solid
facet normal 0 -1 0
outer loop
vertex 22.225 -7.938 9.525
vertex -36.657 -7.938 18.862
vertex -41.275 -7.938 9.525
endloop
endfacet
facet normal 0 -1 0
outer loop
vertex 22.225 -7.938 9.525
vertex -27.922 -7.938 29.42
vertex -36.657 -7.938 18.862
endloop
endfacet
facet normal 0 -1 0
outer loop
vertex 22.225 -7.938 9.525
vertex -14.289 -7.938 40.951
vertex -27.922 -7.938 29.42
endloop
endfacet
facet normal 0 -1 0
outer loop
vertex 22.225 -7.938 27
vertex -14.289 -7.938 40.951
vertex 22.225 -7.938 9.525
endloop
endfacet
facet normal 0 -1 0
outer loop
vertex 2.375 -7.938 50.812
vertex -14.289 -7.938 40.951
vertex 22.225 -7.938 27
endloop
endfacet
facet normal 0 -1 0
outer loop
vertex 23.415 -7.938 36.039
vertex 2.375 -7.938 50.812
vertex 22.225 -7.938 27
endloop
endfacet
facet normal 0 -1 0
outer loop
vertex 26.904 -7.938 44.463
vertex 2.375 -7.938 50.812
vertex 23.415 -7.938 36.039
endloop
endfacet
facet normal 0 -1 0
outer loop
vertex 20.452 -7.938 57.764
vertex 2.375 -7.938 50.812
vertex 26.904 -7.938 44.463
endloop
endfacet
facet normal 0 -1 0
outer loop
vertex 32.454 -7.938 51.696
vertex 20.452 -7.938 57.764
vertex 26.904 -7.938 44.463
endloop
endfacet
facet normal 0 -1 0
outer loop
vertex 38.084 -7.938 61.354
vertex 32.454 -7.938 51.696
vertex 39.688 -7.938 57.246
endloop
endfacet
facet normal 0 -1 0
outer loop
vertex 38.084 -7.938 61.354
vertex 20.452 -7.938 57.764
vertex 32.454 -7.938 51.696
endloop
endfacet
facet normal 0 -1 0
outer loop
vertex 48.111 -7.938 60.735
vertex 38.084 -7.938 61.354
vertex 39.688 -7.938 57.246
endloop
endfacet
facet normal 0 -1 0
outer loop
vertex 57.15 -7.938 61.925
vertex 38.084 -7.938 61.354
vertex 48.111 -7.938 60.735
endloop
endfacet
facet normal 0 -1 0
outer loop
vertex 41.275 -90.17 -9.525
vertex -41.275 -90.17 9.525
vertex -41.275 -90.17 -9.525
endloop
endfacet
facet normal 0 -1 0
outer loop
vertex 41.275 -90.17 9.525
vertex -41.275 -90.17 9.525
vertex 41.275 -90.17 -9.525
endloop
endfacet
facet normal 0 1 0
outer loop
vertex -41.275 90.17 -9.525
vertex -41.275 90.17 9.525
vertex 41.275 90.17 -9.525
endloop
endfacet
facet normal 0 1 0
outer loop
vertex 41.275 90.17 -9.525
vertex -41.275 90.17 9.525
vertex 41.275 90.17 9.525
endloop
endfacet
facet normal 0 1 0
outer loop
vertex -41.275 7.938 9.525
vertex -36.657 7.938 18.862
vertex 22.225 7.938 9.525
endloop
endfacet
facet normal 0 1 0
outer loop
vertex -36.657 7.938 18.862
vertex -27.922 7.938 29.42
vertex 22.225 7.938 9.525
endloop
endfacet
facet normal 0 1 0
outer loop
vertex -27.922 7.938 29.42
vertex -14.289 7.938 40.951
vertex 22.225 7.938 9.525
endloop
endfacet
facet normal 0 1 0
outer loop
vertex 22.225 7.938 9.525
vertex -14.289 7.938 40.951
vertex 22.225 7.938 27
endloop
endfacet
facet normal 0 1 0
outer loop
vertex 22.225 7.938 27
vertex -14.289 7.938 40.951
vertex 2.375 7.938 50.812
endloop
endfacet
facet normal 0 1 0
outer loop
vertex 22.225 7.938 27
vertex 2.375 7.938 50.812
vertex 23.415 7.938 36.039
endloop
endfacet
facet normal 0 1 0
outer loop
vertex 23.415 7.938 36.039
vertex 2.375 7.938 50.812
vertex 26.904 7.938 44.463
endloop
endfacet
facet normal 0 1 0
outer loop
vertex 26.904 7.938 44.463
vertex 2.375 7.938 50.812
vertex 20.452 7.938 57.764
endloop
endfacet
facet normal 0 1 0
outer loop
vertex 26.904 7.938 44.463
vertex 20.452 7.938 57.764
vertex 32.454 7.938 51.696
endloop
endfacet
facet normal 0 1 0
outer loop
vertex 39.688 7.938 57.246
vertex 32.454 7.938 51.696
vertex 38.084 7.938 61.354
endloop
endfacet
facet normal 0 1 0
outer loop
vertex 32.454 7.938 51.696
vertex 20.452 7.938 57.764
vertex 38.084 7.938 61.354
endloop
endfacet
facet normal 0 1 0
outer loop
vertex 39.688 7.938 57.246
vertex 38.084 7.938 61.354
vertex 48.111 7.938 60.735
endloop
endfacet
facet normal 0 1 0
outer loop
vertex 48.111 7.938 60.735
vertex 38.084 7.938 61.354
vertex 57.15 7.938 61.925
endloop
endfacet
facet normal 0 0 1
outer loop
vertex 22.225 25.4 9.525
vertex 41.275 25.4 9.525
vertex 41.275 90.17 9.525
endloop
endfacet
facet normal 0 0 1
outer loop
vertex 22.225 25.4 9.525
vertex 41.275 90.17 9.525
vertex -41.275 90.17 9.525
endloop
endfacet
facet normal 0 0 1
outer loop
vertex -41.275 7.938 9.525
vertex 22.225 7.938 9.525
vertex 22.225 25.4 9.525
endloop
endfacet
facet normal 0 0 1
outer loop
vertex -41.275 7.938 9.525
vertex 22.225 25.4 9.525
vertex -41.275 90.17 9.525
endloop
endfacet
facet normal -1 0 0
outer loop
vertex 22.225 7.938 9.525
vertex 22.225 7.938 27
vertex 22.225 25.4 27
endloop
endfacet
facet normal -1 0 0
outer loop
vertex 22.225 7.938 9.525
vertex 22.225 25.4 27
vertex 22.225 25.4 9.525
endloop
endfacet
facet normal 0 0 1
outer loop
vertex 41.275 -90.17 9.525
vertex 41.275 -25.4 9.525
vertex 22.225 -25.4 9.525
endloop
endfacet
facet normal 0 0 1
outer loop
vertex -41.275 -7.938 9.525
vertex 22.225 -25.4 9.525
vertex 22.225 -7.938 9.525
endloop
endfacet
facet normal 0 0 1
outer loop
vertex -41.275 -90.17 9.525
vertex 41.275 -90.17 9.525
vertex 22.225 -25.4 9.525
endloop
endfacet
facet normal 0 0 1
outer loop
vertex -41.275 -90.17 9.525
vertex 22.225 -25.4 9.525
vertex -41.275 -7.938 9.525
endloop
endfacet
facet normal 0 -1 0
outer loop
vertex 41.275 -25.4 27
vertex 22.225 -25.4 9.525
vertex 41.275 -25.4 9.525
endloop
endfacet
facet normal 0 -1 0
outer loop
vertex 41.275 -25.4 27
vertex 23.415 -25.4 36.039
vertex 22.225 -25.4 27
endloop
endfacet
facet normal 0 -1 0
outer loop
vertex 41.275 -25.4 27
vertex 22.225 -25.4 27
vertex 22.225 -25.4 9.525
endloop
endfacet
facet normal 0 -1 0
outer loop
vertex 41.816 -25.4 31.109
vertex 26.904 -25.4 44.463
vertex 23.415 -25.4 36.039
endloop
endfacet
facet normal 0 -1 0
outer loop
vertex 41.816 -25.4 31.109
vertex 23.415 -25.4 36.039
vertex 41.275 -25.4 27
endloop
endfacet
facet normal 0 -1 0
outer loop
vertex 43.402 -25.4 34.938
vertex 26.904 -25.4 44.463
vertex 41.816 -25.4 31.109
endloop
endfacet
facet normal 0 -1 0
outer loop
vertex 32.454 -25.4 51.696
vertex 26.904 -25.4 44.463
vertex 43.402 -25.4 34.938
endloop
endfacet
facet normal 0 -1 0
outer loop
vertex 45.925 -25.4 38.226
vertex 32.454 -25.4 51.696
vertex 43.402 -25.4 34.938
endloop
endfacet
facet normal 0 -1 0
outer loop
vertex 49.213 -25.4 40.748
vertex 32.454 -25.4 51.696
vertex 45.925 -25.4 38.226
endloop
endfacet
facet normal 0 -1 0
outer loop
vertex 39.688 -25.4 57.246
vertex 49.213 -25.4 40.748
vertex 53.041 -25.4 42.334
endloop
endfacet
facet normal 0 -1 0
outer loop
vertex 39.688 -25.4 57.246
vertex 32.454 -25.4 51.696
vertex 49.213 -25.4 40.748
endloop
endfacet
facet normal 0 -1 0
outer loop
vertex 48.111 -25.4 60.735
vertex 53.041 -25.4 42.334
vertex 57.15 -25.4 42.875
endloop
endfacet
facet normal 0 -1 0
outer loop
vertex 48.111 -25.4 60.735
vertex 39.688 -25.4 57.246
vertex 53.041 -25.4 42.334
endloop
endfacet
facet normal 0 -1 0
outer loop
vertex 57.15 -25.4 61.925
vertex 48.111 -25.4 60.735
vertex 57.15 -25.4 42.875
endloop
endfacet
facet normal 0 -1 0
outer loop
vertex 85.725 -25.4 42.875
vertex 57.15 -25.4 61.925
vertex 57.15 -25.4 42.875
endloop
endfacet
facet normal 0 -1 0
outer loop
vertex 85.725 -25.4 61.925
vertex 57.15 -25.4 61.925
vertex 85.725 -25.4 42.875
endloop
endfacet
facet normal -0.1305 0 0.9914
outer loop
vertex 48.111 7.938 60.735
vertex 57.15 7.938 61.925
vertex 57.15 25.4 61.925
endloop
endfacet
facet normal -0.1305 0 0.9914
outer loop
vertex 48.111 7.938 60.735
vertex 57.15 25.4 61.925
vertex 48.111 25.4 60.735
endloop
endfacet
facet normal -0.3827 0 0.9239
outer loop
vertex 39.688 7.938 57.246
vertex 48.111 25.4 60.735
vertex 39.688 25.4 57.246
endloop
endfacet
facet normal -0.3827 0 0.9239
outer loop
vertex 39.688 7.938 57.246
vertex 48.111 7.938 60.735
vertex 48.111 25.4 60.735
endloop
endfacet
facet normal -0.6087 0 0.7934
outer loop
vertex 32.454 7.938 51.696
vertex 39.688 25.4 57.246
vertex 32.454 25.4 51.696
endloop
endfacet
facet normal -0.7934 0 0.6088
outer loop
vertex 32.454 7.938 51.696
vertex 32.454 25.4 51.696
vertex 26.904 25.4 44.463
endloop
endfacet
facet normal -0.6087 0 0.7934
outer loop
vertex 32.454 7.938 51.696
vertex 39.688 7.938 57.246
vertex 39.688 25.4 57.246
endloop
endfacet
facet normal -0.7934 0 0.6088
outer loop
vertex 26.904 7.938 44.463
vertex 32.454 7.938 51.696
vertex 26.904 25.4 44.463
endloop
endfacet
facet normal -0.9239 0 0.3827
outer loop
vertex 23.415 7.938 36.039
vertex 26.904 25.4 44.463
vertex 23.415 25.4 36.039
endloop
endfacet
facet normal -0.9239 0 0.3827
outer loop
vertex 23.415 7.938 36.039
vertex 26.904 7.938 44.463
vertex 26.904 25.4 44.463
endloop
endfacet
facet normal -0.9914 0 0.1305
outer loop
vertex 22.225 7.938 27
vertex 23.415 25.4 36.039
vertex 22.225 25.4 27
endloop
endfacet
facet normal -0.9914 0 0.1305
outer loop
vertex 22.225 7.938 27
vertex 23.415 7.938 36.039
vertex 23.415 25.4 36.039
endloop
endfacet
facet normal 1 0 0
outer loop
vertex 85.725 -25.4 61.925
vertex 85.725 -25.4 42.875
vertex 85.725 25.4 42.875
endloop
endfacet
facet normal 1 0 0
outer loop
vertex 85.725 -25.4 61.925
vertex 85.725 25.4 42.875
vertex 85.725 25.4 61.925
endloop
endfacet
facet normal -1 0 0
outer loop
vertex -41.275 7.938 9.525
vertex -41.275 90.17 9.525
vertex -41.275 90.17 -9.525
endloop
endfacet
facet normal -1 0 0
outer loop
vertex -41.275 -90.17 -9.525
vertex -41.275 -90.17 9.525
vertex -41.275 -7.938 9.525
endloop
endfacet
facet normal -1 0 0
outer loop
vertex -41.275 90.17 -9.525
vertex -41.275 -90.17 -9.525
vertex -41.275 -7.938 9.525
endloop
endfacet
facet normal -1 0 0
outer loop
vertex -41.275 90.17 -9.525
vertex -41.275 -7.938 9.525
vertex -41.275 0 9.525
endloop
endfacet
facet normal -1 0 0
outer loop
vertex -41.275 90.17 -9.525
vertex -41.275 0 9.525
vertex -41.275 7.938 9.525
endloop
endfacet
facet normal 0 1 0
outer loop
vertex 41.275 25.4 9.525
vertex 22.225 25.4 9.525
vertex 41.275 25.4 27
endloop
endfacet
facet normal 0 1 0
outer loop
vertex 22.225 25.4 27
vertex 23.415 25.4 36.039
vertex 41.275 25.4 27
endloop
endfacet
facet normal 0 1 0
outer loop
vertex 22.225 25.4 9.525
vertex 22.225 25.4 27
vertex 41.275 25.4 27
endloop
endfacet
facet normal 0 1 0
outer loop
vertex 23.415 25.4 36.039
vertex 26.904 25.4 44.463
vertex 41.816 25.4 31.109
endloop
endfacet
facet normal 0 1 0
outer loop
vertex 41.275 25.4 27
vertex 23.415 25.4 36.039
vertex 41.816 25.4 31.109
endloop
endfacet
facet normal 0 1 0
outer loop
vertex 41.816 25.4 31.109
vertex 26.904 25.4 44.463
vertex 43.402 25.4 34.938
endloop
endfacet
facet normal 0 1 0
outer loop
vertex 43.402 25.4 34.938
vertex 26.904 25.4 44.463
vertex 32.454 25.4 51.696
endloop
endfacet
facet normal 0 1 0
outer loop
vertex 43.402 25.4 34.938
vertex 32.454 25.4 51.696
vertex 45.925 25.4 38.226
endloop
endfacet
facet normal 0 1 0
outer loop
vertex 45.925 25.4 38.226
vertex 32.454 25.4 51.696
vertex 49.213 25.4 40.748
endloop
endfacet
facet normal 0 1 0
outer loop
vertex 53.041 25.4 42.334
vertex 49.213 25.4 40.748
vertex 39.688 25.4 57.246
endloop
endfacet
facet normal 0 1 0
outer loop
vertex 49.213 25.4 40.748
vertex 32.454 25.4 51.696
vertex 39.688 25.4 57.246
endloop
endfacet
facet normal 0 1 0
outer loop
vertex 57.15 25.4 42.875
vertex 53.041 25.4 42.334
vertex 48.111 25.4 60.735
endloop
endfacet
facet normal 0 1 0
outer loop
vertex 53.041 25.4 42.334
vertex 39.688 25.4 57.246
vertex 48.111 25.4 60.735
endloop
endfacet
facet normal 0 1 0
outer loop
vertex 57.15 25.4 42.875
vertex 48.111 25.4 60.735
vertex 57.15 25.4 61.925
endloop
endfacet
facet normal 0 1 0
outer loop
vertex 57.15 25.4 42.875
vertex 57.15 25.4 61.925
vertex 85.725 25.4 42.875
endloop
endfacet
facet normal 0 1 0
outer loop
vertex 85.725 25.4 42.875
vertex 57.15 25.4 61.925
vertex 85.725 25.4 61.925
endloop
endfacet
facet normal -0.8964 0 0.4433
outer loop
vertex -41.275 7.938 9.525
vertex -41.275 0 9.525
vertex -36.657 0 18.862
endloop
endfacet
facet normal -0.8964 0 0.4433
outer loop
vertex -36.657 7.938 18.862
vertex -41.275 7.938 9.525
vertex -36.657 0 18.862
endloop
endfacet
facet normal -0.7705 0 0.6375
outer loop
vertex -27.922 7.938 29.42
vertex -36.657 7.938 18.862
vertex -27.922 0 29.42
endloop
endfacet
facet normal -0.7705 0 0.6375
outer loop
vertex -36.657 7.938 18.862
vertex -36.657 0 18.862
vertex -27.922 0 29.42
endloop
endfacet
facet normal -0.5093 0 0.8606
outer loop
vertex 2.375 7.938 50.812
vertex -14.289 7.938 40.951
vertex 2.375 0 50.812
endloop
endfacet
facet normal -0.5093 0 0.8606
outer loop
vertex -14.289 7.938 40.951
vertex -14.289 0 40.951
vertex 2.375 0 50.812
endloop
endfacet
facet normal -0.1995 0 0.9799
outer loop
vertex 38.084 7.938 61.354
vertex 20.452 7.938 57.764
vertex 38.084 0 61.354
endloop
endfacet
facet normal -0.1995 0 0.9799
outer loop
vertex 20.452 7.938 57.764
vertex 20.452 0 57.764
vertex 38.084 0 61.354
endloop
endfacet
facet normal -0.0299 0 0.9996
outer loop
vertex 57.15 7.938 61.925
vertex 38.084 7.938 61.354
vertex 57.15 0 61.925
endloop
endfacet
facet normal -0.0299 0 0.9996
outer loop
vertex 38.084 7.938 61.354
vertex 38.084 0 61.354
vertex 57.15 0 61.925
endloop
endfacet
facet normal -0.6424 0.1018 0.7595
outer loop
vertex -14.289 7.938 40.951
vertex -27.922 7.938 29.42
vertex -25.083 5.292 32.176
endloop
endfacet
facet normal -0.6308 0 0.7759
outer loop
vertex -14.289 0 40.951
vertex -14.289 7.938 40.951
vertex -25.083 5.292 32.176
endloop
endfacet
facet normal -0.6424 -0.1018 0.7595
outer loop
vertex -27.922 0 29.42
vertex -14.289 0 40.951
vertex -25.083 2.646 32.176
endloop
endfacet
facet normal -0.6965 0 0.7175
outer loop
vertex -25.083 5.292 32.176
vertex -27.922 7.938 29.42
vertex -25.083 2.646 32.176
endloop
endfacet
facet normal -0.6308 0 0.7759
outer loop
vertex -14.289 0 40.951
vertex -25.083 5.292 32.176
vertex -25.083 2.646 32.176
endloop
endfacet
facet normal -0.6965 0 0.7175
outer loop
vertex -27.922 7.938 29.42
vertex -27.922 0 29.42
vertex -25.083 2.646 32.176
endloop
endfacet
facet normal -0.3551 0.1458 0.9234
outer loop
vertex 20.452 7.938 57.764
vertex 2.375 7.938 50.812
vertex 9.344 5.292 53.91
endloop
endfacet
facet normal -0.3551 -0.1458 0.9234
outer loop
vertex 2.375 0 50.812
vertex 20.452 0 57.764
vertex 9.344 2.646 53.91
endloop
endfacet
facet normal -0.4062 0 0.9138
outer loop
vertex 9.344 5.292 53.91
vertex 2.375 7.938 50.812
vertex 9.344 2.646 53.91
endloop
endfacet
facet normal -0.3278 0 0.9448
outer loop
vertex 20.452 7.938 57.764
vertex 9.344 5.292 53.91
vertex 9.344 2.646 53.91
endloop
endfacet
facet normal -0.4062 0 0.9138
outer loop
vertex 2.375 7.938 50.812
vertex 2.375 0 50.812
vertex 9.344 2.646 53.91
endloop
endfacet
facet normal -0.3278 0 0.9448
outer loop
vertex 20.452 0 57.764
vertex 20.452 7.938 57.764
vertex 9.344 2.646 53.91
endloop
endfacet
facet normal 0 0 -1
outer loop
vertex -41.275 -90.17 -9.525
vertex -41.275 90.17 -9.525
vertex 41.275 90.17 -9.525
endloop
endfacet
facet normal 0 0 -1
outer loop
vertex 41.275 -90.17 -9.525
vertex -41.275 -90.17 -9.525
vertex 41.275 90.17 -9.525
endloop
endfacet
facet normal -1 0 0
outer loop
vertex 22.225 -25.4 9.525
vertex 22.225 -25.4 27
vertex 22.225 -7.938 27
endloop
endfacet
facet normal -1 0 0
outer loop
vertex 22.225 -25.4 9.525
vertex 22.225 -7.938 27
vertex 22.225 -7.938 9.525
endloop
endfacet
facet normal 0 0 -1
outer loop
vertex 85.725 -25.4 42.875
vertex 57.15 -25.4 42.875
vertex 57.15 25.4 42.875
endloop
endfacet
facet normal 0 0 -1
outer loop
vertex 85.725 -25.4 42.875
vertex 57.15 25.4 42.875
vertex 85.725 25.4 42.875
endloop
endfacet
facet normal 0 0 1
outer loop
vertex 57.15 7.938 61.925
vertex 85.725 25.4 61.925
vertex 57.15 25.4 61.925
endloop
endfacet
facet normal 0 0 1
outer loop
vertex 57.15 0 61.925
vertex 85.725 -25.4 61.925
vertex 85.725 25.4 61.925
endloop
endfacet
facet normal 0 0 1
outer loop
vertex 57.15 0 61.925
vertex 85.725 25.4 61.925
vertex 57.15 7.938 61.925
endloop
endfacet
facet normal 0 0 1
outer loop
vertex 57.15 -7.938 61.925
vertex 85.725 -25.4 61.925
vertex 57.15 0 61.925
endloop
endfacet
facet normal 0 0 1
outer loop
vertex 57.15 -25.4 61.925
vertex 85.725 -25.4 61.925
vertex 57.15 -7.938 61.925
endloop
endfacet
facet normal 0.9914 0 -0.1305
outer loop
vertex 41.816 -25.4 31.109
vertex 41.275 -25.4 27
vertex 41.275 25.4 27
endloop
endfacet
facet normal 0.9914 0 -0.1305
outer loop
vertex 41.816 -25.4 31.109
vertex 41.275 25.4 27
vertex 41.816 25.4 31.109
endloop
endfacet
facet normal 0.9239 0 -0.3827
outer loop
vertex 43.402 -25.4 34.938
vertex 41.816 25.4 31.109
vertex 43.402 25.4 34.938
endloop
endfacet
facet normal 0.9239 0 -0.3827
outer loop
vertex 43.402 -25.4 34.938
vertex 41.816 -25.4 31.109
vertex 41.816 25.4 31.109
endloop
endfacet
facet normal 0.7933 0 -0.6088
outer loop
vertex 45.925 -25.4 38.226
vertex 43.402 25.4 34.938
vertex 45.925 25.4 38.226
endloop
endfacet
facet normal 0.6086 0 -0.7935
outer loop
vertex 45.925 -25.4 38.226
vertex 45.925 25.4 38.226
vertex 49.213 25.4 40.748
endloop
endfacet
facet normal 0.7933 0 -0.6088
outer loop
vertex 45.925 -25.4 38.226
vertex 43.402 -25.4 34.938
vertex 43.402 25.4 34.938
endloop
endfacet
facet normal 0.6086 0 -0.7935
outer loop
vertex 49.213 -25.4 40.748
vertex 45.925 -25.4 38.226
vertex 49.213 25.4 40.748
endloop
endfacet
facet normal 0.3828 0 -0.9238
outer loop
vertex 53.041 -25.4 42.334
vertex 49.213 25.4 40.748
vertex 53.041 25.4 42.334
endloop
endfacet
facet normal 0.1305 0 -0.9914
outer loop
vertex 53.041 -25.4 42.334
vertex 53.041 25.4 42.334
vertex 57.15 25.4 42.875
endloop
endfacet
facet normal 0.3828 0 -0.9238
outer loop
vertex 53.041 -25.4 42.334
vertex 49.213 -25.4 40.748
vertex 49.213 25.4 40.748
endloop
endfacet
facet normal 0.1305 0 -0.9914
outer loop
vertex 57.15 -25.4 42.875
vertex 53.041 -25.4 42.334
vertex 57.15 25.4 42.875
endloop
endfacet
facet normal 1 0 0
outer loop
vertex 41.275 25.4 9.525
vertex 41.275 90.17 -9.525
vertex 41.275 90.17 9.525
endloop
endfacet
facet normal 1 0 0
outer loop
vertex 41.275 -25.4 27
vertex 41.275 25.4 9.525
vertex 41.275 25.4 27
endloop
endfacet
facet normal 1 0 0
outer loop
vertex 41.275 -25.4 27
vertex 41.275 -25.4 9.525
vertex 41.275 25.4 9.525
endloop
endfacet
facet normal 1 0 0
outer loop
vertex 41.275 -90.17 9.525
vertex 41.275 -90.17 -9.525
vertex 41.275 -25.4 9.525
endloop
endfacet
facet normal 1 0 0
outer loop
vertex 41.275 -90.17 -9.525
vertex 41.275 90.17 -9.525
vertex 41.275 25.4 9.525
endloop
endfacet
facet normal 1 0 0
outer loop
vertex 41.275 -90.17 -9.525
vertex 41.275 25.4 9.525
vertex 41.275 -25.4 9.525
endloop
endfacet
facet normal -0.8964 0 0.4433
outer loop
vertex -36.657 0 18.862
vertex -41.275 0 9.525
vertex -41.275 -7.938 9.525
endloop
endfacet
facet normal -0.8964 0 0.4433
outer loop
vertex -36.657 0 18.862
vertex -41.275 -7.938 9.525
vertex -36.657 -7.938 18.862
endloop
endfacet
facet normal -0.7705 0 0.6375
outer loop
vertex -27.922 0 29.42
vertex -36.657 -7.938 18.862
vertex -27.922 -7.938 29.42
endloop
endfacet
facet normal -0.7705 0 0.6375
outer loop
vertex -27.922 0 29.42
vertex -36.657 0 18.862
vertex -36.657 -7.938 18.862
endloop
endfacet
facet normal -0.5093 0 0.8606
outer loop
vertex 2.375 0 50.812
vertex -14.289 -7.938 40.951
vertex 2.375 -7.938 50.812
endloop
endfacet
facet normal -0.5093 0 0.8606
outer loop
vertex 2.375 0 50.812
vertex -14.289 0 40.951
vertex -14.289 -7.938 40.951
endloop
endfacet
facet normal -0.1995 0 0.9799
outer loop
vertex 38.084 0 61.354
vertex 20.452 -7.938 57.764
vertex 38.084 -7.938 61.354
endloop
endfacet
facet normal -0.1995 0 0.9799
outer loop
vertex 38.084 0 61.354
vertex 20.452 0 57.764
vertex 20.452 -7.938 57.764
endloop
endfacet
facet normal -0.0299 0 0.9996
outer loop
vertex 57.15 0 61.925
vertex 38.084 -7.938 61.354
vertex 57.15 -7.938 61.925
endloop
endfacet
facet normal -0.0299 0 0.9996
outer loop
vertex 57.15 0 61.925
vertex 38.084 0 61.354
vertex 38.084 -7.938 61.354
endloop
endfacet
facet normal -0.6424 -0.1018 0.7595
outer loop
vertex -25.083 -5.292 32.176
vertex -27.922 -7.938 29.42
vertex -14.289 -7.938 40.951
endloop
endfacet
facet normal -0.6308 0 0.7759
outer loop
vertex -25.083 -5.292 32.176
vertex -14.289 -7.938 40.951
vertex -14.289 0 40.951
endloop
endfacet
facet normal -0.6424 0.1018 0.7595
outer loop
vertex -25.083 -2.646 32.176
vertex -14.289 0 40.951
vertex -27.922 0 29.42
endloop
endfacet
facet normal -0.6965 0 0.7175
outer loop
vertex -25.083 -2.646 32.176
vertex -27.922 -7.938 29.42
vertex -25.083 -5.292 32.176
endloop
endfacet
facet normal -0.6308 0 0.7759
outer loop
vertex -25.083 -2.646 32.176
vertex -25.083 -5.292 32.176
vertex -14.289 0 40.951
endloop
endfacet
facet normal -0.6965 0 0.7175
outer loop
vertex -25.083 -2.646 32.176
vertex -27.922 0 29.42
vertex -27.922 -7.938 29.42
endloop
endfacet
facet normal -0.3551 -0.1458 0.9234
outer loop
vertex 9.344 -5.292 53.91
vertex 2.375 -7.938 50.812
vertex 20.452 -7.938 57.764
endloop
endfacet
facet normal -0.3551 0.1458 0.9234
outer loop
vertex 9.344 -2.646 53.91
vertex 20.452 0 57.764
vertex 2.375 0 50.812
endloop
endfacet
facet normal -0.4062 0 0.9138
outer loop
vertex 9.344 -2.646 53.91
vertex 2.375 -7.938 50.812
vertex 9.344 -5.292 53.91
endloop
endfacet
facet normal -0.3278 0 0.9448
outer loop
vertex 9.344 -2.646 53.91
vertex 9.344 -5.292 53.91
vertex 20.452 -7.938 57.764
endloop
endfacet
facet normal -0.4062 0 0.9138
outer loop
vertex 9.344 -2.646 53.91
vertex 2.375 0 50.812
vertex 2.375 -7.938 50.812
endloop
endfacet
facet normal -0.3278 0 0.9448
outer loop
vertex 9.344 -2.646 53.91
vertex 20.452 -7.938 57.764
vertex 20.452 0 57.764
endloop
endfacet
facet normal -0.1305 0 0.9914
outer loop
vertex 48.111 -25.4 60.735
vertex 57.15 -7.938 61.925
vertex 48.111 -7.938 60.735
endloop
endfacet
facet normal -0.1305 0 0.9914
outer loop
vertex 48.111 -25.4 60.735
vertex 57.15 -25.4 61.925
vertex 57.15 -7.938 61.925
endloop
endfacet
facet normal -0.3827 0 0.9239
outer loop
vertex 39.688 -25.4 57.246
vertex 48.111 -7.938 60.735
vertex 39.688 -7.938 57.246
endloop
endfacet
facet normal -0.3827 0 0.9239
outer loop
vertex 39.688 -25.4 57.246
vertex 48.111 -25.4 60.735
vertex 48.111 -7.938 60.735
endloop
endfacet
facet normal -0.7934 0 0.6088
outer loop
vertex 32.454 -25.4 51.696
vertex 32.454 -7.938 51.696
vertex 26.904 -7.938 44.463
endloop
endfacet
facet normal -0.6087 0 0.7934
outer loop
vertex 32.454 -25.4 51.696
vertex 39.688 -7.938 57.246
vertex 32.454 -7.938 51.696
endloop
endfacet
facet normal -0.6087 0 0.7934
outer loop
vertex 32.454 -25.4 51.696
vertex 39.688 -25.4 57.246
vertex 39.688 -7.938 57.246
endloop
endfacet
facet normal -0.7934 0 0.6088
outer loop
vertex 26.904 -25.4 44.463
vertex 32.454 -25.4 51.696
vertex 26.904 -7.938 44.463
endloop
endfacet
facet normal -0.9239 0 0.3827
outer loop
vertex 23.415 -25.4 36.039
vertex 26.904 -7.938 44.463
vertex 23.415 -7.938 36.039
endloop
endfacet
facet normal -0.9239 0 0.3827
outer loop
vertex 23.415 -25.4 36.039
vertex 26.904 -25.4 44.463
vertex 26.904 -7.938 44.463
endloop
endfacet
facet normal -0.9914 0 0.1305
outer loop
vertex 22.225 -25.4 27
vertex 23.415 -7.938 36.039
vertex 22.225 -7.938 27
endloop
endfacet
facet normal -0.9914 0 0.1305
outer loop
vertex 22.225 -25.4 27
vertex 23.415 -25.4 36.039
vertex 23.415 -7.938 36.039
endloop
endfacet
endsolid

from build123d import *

# Parameters (mm, degrees)
F1_DEPTH = 90.17
F0_W     = 25.4
F0_H     = 19.05
F2_DEPTH = 25.4
F3_DEPTH = 7.9375


with BuildPart() as f1:
    # F0 (on Front) → F1 (new body, symmetric)
    with BuildSketch(Plane.XZ):
        Polygon((41.275, -9.525), (41.275, 9.525), (22.225, 9.525), (-41.275, 9.525), (-41.275, -9.525), align=None)
    extrude(amount=F1_DEPTH, both=True)

    # F0 (on Front) → F2 (join, symmetric)
    with BuildSketch(Plane.XZ):
        with BuildLine():
            Line((22.225, 9.525), (41.275, 9.525))
            Line((41.275, 9.525), (41.275, 27.0002))
            ThreePointArc((41.275, 27.0002), (45.9246798487, 38.2255201513), (57.15, 42.8752))
            Line((57.15, 42.8752), (60.325, 42.8752))
            Line((60.325, 42.8752), (60.325, 61.9252))
            Line((60.325, 61.9252), (57.15, 61.9252))
            ThreePointArc((57.15, 61.9252), (32.4542956671, 51.6959043329), (22.225, 27.0002))
            Line((22.225, 27.0002), (22.225, 9.525))
        make_face()
        with Locations((73.025, 52.4002)):
            Rectangle(F0_W, F0_H)
    extrude(amount=F2_DEPTH, both=True)

    # F0 (on Front) → F3 (join, symmetric)
    with BuildSketch(Plane.XZ):
        with BuildLine():
            Line((-41.275, 9.525), (22.225, 9.525))
            Line((22.225, 9.525), (22.225, 27.0002))
            ThreePointArc((22.225, 27.0002), (32.4542956671, 51.6959043329), (57.15, 61.9252))
            add(Edge.make_bspline(
                [(-41.275, 9.525), (-35.8186467643, 28.3691705971), (4.2723575607, 65.0347471237), (57.15, 61.9252)],
                knots=[0, 0, 0, 0, 111.5045361635, 111.5045361635, 111.5045361635, 111.5045361635], degree=3))
        make_face()
    extrude(amount=F3_DEPTH, both=True)


solid = f1.part
